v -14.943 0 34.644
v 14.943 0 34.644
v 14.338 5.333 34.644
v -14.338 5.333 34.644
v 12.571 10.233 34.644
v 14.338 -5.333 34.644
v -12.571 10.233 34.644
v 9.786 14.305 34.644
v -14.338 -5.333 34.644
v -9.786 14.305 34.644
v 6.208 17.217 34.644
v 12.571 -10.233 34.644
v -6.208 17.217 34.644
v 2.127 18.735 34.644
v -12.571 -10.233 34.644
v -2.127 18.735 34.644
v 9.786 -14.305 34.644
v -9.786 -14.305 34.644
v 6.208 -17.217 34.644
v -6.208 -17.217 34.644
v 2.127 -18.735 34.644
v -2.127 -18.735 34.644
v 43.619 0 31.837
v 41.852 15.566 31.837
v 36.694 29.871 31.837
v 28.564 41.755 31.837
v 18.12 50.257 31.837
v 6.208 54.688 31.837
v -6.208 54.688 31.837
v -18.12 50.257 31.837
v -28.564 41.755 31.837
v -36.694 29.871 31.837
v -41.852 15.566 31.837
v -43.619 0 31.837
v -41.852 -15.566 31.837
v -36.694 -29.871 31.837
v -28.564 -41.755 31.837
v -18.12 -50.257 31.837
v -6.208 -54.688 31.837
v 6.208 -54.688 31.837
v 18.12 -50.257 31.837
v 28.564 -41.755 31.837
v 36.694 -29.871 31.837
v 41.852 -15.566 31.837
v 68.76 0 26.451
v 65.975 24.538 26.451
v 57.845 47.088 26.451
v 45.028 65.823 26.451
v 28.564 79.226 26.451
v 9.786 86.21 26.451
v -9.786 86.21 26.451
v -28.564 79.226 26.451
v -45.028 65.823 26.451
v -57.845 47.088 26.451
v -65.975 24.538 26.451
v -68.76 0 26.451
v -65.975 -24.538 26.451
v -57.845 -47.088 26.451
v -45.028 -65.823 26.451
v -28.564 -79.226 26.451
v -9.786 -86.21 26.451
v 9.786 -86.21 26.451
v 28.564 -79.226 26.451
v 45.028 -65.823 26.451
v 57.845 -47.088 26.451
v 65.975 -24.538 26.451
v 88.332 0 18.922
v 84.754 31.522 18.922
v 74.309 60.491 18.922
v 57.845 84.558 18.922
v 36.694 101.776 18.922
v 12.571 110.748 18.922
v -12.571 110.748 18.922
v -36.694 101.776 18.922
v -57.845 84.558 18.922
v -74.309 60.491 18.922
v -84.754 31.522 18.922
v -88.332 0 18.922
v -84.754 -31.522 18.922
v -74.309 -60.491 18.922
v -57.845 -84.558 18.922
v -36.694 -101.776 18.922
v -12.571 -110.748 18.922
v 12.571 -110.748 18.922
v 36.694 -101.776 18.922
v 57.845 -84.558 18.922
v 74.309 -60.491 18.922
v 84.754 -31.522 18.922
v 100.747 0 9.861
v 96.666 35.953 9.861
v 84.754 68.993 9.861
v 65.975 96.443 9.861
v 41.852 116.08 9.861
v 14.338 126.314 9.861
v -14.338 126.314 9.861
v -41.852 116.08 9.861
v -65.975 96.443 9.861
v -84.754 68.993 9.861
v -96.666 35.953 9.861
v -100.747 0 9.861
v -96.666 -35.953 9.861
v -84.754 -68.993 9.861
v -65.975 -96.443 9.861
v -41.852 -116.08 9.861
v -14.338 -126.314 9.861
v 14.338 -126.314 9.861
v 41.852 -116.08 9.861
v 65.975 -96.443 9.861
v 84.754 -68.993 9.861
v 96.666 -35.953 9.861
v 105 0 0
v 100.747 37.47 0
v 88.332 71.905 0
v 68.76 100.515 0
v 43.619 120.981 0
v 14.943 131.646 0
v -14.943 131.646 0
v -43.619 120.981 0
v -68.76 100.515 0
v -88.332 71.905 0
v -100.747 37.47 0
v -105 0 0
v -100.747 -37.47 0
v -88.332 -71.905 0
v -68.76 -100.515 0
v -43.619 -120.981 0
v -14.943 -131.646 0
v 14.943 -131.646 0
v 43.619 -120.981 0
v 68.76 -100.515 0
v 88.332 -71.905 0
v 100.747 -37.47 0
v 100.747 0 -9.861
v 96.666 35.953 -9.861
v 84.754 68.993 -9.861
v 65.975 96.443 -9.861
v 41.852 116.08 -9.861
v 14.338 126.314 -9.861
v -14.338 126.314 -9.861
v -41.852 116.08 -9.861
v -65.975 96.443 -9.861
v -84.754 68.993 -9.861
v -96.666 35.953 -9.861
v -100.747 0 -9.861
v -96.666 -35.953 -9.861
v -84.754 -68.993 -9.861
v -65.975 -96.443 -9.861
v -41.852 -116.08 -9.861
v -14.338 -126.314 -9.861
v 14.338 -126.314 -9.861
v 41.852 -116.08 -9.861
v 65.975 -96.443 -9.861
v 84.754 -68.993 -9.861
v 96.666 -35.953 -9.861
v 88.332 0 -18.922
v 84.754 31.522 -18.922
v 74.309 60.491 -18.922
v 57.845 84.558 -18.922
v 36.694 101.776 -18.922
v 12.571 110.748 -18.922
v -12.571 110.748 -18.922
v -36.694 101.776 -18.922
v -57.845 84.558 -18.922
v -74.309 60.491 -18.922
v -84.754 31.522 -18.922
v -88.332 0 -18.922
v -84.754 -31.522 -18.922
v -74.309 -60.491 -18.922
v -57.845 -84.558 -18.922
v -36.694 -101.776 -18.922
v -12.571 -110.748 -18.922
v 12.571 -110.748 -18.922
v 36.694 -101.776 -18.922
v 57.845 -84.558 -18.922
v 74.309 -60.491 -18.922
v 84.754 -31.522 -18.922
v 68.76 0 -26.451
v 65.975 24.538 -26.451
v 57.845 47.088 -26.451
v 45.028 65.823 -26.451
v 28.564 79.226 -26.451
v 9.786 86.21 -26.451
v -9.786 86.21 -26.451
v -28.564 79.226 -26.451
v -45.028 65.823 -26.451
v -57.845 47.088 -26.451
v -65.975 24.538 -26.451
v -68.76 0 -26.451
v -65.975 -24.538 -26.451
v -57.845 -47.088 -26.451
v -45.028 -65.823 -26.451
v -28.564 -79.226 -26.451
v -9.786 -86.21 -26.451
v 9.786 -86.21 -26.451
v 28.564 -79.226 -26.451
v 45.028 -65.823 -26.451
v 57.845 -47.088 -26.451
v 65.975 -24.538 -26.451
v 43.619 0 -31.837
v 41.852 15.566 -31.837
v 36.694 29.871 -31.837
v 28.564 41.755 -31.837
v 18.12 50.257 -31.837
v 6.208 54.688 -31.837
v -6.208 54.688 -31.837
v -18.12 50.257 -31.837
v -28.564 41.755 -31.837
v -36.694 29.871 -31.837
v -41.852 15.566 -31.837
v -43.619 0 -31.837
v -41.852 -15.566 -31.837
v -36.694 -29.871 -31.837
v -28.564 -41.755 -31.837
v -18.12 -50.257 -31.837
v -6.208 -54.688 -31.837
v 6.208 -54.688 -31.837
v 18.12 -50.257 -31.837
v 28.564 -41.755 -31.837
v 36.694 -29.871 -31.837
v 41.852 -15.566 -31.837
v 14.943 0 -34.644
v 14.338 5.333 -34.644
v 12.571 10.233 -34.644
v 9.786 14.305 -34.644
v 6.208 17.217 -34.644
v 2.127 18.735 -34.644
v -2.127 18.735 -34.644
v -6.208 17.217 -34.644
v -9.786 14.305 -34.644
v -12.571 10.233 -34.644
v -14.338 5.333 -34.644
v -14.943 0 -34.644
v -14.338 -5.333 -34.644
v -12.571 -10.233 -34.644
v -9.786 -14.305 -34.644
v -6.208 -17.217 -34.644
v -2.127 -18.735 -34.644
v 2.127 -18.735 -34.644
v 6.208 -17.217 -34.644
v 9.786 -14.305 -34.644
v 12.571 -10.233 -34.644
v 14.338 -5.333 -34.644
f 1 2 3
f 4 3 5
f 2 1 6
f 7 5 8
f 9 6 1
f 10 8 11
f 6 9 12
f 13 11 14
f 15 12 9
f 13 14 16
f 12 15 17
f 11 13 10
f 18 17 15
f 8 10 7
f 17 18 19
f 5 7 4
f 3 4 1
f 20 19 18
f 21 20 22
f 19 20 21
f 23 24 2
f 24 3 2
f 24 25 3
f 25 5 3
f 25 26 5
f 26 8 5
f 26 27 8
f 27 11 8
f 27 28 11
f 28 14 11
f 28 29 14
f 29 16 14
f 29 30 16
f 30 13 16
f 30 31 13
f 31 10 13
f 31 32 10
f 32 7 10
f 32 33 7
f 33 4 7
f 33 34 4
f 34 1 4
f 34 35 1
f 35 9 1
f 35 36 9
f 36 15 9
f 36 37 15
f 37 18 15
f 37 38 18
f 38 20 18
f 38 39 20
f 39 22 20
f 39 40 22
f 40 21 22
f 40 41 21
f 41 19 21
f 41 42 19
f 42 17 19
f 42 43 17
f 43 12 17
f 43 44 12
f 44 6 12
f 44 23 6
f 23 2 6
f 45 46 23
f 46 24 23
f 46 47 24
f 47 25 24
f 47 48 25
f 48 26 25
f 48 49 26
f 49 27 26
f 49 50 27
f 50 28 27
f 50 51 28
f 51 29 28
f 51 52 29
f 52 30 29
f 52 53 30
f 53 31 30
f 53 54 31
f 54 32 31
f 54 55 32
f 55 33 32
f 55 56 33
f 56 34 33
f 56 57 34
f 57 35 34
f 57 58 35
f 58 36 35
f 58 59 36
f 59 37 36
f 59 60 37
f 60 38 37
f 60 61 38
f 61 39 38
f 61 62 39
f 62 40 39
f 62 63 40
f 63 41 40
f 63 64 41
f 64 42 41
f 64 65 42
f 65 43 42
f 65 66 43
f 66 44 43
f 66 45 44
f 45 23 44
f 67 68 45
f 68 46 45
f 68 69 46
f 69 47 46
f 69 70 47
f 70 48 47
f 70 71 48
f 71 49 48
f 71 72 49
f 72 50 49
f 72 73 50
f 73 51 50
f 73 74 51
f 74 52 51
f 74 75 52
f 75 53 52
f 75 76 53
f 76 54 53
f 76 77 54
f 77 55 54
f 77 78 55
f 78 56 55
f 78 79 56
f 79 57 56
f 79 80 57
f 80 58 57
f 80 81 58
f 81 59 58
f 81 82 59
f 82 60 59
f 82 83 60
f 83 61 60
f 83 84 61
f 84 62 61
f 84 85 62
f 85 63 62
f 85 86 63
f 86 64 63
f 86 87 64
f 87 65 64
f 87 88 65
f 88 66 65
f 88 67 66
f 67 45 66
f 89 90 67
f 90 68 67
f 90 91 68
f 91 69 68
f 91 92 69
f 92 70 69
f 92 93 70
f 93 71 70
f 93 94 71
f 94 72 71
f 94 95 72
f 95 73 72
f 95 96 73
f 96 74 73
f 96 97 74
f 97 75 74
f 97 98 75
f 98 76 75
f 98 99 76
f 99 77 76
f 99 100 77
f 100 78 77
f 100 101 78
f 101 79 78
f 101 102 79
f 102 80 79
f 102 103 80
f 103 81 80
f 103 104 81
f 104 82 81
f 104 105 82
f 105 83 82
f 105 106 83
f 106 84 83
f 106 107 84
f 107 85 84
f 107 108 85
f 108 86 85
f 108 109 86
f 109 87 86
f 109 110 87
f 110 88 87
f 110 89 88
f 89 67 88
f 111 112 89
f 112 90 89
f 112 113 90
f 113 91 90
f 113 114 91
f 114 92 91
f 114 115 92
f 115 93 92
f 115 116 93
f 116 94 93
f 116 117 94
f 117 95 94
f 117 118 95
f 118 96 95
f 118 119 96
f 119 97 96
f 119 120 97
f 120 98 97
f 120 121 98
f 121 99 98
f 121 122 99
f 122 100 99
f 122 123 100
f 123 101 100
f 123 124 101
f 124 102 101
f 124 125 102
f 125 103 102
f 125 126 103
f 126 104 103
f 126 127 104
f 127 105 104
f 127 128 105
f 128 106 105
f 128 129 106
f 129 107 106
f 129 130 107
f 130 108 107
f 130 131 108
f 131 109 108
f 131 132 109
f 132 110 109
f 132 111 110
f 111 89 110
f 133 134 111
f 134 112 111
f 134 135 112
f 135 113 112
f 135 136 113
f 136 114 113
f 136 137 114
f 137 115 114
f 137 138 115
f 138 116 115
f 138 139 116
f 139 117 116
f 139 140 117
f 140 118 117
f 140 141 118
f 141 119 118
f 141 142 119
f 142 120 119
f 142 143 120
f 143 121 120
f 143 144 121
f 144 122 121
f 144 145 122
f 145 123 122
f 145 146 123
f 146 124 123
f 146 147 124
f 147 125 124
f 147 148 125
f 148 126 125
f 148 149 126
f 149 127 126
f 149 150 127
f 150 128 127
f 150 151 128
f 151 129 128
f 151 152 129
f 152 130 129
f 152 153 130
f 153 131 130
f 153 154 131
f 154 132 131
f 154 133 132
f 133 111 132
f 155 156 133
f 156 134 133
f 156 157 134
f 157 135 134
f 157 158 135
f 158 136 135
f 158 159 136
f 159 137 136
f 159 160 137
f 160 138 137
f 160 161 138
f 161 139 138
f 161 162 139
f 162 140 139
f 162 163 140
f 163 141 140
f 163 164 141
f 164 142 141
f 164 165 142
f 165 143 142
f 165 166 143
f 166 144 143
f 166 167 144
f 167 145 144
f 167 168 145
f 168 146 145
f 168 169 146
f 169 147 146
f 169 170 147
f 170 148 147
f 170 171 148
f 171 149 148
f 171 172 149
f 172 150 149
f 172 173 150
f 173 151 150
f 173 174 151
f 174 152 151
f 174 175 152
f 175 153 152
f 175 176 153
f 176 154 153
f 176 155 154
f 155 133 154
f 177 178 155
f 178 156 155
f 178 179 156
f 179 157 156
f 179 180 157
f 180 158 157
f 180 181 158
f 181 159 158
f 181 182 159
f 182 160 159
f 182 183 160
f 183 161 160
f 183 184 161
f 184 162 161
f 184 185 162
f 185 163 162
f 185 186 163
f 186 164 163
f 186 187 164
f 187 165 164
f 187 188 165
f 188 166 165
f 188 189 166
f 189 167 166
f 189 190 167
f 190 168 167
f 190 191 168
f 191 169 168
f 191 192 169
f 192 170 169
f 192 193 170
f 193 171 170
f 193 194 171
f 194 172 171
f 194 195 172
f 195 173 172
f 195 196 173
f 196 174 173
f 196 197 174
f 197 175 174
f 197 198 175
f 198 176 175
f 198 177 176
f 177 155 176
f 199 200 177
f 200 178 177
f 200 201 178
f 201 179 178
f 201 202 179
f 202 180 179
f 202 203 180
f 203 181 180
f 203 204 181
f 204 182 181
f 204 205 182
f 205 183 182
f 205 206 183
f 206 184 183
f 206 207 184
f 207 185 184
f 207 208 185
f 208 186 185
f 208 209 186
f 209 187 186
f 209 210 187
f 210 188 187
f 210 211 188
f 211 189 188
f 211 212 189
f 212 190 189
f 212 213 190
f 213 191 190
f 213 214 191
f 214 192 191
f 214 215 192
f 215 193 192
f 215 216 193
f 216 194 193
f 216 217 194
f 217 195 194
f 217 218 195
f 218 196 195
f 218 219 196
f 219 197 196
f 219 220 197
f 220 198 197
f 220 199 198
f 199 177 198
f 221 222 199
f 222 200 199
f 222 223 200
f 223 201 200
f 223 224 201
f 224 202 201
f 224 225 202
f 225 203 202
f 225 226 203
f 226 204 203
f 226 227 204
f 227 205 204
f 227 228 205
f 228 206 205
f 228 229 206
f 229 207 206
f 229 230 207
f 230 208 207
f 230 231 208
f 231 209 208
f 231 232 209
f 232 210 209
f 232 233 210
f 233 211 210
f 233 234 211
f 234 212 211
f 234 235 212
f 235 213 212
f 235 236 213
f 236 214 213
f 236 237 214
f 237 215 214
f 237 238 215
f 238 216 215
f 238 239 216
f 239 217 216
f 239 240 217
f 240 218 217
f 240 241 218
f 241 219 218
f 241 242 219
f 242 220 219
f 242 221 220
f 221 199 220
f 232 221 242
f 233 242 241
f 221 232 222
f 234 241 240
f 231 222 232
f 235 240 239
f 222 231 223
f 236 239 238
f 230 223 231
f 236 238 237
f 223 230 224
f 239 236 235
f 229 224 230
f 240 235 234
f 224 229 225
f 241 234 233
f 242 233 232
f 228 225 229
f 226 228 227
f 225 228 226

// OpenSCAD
// Generated by SolidPython 1.0.1 on 2020-07-29 00:46:52


scale(v = [15, 19, 5]) {
	sphere(r = 7);
}
/***********************************************
*********      SolidPython code:      **********
************************************************
 
# import packages: SolidPython
from solid import *
from solid.utils import *
from itertools import chain, combinations, permutations


class Resize:

    def __init__(self, scad_file):
        self.scad_file = scad_file
        #self.scad_file = import_scad(scad_file)
        # cone/cylinder param:
        self.r1 = 0
        self.r2 = 0
        self.h = 0
        # rectangular prism param:
        self.w = 0
        self.l = 0
        # ellipse param:
        self.r = 0

    # import OpenScad code (file name corresponds to shape)


    # classify shape + parameters
    def assign(self, param1, param2, param3):
        if self.scad_file == 'cone.scad':
            self.r1 = param1
            self.r2 = param2
            self.h = param3
        elif self.scad_file == 'cylinder.scad':
            self.r1 = param1
            self.r2 = param2
            self.h = param3
        elif self.scad_file == 'rectangularPrism.scad':
            self.h = param1
            self.l = param2
            self.w = param3
        else:
            self.r = param1
            self.h = param2

    # resize parameters
    def iterate(self):
        x = range(3, 20, 2)
        i = 1
        if self.scad_file == 'cone.scad':
            tempList = list(permutations(x, 2))
            for temp in tempList:
                param1 = temp[0]
                param2 = temp[1]
                filepath = 'produced_scad_files/' + 'cone' + str(param1) + '_' + str(param2) + '_' + '.scad'
                scad_render_to_file(cylinder(h=param1, r1=param2, r2=0), filepath)

        elif self.scad_file == 'cylinder.scad':
            tempList = list(permutations(x, 3))
            for temp in tempList:
                param1 = temp[0]
                param2 = temp[1]
                filepath = 'produced_scad_files/' + 'cylinder' + str(param1) + '_' + str(param2) + '_' + '.scad'
                scad_render_to_file(cylinder(h=param1, r1=param2, r2=param2), filepath)

        elif self.scad_file == 'rectangularPrism.scad':
            tempList = list(permutations(x, 3))
            for temp in tempList:
                param1 = temp[0]
                param2 = temp[1]
                param3 = temp[2]
                filepath = 'produced_scad_files/' + 'rectangularPrism' + str(param1) + '_' + str(param2) + '_' + str(
                    param3) + '.scad'
                scad_render_to_file(cube(size=(param1, param2, param3)), filepath)

        elif self.scad_file == 'ellipse.scad':
            tempList = list(permutations(x, 4))
            for temp in tempList:
                param1 = temp[0]
                param2 = temp[1]
                param3 = temp[2]
                param4 = temp[3]
                filepath = 'produced_scad_files/' + 'ellipse' + str(param1) + '_' + str(param2) + '_' + str(param3) + '_' + str(param4) + '.scad'
                scad_render_to_file(scale([param1, param2, param3])(sphere(r=param4)), filepath)

    def render_to_scadfile(self):
        scad_render_to_file(scad, 'example.scad') 
 
************************************************/
